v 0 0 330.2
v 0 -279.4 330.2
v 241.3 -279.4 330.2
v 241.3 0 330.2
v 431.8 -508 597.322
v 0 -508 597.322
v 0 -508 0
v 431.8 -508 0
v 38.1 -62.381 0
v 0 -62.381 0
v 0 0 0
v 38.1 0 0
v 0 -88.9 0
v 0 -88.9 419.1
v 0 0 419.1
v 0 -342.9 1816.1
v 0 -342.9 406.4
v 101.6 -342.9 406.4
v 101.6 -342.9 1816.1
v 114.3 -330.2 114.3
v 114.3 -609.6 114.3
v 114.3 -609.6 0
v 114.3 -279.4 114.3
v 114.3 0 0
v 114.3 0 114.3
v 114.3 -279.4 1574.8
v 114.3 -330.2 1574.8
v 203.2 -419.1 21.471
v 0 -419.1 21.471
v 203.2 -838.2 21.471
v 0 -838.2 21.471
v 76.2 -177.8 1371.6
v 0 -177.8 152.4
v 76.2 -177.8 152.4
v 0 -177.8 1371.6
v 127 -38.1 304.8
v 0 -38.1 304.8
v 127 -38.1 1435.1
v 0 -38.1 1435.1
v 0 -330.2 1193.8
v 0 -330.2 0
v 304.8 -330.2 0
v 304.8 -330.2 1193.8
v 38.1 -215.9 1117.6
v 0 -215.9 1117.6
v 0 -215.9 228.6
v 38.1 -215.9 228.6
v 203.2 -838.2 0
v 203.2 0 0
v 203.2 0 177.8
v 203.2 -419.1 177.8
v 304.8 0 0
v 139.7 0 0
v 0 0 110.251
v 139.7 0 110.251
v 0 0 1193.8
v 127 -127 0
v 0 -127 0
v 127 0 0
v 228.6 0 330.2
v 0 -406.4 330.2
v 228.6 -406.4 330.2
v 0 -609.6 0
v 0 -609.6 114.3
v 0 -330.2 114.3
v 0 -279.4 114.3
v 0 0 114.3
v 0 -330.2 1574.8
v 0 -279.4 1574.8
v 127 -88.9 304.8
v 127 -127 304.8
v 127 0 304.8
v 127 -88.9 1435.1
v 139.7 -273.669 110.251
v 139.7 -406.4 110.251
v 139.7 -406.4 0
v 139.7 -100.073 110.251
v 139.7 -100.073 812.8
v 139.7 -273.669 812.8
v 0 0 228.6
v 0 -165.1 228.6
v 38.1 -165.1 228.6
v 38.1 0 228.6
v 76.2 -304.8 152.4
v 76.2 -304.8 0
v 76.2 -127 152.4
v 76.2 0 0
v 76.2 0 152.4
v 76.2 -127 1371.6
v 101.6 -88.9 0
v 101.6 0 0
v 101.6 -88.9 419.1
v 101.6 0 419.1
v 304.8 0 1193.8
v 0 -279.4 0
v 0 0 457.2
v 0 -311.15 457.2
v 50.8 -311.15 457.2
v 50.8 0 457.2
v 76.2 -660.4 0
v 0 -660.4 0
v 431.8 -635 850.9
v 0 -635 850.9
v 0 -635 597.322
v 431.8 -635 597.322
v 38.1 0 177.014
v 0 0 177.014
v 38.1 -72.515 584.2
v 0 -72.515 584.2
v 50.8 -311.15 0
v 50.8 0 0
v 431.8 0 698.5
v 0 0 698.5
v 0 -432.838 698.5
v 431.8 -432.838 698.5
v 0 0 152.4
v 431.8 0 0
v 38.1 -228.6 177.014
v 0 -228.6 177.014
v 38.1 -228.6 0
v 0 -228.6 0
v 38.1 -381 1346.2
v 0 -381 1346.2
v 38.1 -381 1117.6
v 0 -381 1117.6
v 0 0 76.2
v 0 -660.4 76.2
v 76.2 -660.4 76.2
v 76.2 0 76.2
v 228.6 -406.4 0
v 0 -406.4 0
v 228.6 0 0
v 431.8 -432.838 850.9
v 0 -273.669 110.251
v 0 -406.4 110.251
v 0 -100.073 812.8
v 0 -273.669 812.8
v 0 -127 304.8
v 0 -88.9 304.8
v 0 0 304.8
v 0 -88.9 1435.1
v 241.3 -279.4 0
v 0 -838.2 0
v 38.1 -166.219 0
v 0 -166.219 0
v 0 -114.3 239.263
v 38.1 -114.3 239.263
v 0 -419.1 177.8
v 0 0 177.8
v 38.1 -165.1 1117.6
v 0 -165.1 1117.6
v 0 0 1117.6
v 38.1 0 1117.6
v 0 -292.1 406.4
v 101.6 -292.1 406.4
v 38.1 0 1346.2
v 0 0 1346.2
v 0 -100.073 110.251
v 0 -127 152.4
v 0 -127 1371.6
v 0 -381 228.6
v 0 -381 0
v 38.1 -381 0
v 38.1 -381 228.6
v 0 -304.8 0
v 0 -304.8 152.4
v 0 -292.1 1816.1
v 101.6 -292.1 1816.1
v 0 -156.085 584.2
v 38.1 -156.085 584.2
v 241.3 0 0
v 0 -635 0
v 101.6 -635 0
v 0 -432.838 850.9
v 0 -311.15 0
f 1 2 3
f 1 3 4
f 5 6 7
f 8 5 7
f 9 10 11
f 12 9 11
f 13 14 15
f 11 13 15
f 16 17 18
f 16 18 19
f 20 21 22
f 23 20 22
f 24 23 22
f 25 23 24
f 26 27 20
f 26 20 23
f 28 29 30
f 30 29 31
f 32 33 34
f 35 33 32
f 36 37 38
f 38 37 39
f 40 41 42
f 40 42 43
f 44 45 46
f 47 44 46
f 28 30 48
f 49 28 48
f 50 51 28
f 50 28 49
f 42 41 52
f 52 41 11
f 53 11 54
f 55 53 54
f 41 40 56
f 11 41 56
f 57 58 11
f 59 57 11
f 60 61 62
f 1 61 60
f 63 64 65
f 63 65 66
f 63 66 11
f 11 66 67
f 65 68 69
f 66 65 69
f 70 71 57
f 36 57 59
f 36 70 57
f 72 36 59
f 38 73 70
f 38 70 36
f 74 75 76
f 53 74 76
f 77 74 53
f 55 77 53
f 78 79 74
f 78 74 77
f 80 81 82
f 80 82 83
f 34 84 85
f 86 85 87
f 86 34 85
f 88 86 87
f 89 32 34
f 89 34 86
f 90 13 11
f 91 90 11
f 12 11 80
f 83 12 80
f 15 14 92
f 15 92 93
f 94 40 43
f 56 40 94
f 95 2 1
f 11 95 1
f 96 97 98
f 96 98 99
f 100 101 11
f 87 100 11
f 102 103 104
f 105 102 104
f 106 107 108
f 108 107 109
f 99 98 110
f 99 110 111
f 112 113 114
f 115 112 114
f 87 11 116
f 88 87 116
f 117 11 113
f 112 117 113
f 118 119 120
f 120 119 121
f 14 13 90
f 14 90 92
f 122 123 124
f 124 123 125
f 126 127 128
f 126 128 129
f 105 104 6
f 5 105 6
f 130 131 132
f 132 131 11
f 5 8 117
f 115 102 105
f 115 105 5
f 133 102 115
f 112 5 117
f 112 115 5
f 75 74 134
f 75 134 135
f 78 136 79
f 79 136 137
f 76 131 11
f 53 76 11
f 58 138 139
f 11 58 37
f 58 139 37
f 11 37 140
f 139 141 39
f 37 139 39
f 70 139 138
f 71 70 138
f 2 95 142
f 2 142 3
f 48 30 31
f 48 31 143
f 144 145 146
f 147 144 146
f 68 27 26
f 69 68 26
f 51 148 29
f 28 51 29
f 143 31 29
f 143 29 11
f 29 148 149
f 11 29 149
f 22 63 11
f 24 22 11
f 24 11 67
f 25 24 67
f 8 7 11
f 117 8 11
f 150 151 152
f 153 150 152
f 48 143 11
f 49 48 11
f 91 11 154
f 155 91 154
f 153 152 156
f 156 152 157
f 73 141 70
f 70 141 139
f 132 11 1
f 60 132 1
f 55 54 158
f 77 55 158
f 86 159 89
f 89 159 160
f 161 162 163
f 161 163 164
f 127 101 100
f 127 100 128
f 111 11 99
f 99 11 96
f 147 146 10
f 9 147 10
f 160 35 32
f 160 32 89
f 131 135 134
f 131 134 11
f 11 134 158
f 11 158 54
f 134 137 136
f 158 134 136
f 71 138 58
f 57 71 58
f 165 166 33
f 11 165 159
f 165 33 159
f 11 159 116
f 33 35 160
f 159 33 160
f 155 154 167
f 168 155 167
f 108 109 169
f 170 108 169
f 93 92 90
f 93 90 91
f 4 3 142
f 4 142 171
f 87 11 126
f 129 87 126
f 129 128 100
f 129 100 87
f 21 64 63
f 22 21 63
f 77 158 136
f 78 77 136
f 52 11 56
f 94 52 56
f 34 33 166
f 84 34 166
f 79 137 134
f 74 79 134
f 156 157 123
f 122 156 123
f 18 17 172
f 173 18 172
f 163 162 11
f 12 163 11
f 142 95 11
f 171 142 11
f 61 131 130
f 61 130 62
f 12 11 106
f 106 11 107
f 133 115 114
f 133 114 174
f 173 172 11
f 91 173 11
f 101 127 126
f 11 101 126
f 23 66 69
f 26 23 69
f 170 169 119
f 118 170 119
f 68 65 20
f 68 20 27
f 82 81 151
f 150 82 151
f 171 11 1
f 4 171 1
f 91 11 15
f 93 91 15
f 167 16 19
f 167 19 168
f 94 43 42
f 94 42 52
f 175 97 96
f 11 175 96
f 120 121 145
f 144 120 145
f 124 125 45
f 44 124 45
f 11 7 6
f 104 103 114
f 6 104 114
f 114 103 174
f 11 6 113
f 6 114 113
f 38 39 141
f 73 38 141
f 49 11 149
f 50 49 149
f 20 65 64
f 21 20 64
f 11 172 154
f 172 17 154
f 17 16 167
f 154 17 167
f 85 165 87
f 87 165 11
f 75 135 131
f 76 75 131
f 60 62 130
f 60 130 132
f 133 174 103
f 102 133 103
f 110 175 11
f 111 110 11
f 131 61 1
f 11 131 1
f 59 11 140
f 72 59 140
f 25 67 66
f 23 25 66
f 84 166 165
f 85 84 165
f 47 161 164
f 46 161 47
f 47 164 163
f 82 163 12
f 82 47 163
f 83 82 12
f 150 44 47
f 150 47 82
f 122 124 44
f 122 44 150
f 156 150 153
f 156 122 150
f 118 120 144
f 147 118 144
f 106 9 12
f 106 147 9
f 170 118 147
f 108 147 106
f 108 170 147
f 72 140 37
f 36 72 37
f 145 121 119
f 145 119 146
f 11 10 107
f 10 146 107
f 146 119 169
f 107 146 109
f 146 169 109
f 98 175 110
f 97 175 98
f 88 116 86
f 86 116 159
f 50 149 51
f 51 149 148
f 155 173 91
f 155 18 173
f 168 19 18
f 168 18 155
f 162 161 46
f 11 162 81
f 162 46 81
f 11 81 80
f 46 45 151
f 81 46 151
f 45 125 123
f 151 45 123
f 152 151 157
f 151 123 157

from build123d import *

# Parameters (mm, degrees)
F1_DEPTH  = 431.8
F2_W      = 279.4
F2_H      = 330.2
F3_DEPTH  = 241.3
F4_W      = 88.9
F4_H      = 419.1
F5_DEPTH  = 101.6
F6_W      = 311.15
F6_H      = 457.2
F7_DEPTH  = 50.8
F8_W      = 50.8
F8_H      = 1460.5
F9_DEPTH  = 114.3
F10_W     = 165.1
F10_H     = 228.6
F11_DEPTH = 38.1
F12_W     = 50.8
F12_H     = 1409.7
F13_DEPTH = 101.6
F14_W     = 50.8
F14_H     = 1219.2
F15_DEPTH = 76.2
F17_DEPTH = 127
F19_DEPTH = 203.2
F20_W     = 406.4
F20_H     = 330.2
F21_DEPTH = 228.6
F22_W     = 660.4
F22_H     = 76.2
F23_DEPTH = 76.2
F25_DEPTH = 139.7
F26_W     = 330.2
F26_H     = 1193.8
F27_DEPTH = 304.8
F29_DEPTH = 38.1


with BuildPart() as f1:
    # F0 (on Right) → F1 (new body)
    with BuildSketch(Plane.YZ):
        Polygon((-508, 0), (0, 0), (0, 698.5), (-432.838172, 698.5), (-432.838172, 850.9), (-635, 850.9), (-635, 597.32157), (-508, 597.32157), align=None)
    extrude(amount=F1_DEPTH)


with BuildPart() as f3:
    # F2 (on Right) → F3 (new body)
    with BuildSketch(Plane.YZ):
        with Locations((-139.7, 165.1)):
            Rectangle(F2_W, F2_H)
    extrude(amount=F3_DEPTH)


with BuildPart() as f5:
    # F4 (on Right) → F5 (new body)
    with BuildSketch(Plane.YZ):
        with Locations((-44.45, 209.55)):
            Rectangle(F4_W, F4_H)
    extrude(amount=F5_DEPTH)


with BuildPart() as f7:
    # F6 (on Right) → F7 (new body)
    with BuildSketch(Plane.YZ):
        with Locations((-155.575, 228.6)):
            Rectangle(F6_W, F6_H)
    extrude(amount=F7_DEPTH)


with BuildPart() as f9:
    # F8 (on Right) → F9 (new body)
    with BuildSketch(Plane.YZ):
        Polygon((-609.6, 0), (0, 0), (0, 114.3), (-279.4, 114.3), (-330.2, 114.3), (-609.6, 114.3), align=None)
        with Locations((-304.8, 844.55)):
            Rectangle(F8_W, F8_H)
    extrude(amount=F9_DEPTH)


with BuildPart() as f11:
    # F10 (on Right) → F11 (new body)
    with BuildSketch(Plane.YZ):
        with Locations((-82.55, 114.3)):
            Rectangle(F10_W, F10_H)
        Polygon((-215.9, 0), (-165.1, 0), (-165.1, 228.6), (-165.1, 1117.6), (0, 1117.6), (0, 1346.2), (-381, 1346.2), (-381, 1117.6), (-215.9, 1117.6), (-215.9, 228.6), align=None)
        with Locations((-298.45, 114.3)):
            Rectangle(F10_W, F10_H)
    extrude(amount=F11_DEPTH)


with BuildPart() as f13:
    # F12 (on Right) → F13 (new body)
    with BuildSketch(Plane.YZ):
        Polygon((-635, 0), (0, 0), (-292.1, 406.4), (-342.9, 406.4), align=None)
        with Locations((-317.5, 1111.25)):
            Rectangle(F12_W, F12_H)
    extrude(amount=F13_DEPTH)


with BuildPart() as f15:
    # F14 (on Right) → F15 (new body)
    with BuildSketch(Plane.YZ):
        Polygon((-304.8, 0), (0, 0), (0, 152.4), (-127, 152.4), (-177.8, 152.4), (-304.8, 152.4), align=None)
        with Locations((-152.4, 762)):
            Rectangle(F14_W, F14_H)
    extrude(amount=F15_DEPTH)


with BuildPart() as f17:
    # F16 (on Right) → F17 (new body)
    with BuildSketch(Plane.YZ):
        Polygon((-127, 0), (0, 0), (0, 304.8), (-38.1, 304.8), (-38.1, 1435.1), (-88.9, 1435.1), (-88.9, 304.8), (-127, 304.8), align=None)
    extrude(amount=F17_DEPTH)


with BuildPart() as f19:
    # F18 (on Right) → F19 (new body)
    with BuildSketch(Plane.YZ):
        Polygon((-838.2, 0), (0, 0), (0, 177.8), (-419.1, 177.8), (-419.1, 21.471366), (-838.2, 21.471366), align=None)
    extrude(amount=F19_DEPTH)


with BuildPart() as f21:
    # F20 (on Right) → F21 (new body)
    with BuildSketch(Plane.YZ):
        with Locations((-203.2, 165.1)):
            Rectangle(F20_W, F20_H)
    extrude(amount=F21_DEPTH)


with BuildPart() as f23:
    # F22 (on Right) → F23 (new body)
    with BuildSketch(Plane.YZ):
        with Locations((-330.2, 38.1)):
            Rectangle(F22_W, F22_H)
    extrude(amount=F23_DEPTH)


with BuildPart() as f25:
    # F24 (on Right) → F25 (new body)
    with BuildSketch(Plane.YZ):
        Polygon((-406.4, 0), (0, 0), (0, 110.25124), (-100.072682, 110.25124), (-100.072682, 812.8), (-273.669153, 812.8), (-273.669153, 110.25124), (-406.4, 110.25124), align=None)
    extrude(amount=F25_DEPTH)


with BuildPart() as f27:
    # F26 (on Right) → F27 (new body)
    with BuildSketch(Plane.YZ):
        with Locations((-165.1, 596.9)):
            Rectangle(F26_W, F26_H)
    extrude(amount=F27_DEPTH)


with BuildPart() as f29:
    # F28 (on Right) → F29 (new body)
    with BuildSketch(Plane.YZ):
        Polygon((-62.381421, 0), (0, 0), (0, 177.014232), (-72.514658, 584.2), (-156.085342, 584.2), (-228.6, 177.014232), (-228.6, 0), (-166.218579, 0), (-114.3, 239.262546), align=None)
    extrude(amount=F29_DEPTH)


solid = Compound([f1.part, f3.part, f5.part, f7.part, f9.part, f11.part, f13.part, f15.part, f17.part, f19.part, f21.part, f23.part, f25.part, f27.part, f29.part])
